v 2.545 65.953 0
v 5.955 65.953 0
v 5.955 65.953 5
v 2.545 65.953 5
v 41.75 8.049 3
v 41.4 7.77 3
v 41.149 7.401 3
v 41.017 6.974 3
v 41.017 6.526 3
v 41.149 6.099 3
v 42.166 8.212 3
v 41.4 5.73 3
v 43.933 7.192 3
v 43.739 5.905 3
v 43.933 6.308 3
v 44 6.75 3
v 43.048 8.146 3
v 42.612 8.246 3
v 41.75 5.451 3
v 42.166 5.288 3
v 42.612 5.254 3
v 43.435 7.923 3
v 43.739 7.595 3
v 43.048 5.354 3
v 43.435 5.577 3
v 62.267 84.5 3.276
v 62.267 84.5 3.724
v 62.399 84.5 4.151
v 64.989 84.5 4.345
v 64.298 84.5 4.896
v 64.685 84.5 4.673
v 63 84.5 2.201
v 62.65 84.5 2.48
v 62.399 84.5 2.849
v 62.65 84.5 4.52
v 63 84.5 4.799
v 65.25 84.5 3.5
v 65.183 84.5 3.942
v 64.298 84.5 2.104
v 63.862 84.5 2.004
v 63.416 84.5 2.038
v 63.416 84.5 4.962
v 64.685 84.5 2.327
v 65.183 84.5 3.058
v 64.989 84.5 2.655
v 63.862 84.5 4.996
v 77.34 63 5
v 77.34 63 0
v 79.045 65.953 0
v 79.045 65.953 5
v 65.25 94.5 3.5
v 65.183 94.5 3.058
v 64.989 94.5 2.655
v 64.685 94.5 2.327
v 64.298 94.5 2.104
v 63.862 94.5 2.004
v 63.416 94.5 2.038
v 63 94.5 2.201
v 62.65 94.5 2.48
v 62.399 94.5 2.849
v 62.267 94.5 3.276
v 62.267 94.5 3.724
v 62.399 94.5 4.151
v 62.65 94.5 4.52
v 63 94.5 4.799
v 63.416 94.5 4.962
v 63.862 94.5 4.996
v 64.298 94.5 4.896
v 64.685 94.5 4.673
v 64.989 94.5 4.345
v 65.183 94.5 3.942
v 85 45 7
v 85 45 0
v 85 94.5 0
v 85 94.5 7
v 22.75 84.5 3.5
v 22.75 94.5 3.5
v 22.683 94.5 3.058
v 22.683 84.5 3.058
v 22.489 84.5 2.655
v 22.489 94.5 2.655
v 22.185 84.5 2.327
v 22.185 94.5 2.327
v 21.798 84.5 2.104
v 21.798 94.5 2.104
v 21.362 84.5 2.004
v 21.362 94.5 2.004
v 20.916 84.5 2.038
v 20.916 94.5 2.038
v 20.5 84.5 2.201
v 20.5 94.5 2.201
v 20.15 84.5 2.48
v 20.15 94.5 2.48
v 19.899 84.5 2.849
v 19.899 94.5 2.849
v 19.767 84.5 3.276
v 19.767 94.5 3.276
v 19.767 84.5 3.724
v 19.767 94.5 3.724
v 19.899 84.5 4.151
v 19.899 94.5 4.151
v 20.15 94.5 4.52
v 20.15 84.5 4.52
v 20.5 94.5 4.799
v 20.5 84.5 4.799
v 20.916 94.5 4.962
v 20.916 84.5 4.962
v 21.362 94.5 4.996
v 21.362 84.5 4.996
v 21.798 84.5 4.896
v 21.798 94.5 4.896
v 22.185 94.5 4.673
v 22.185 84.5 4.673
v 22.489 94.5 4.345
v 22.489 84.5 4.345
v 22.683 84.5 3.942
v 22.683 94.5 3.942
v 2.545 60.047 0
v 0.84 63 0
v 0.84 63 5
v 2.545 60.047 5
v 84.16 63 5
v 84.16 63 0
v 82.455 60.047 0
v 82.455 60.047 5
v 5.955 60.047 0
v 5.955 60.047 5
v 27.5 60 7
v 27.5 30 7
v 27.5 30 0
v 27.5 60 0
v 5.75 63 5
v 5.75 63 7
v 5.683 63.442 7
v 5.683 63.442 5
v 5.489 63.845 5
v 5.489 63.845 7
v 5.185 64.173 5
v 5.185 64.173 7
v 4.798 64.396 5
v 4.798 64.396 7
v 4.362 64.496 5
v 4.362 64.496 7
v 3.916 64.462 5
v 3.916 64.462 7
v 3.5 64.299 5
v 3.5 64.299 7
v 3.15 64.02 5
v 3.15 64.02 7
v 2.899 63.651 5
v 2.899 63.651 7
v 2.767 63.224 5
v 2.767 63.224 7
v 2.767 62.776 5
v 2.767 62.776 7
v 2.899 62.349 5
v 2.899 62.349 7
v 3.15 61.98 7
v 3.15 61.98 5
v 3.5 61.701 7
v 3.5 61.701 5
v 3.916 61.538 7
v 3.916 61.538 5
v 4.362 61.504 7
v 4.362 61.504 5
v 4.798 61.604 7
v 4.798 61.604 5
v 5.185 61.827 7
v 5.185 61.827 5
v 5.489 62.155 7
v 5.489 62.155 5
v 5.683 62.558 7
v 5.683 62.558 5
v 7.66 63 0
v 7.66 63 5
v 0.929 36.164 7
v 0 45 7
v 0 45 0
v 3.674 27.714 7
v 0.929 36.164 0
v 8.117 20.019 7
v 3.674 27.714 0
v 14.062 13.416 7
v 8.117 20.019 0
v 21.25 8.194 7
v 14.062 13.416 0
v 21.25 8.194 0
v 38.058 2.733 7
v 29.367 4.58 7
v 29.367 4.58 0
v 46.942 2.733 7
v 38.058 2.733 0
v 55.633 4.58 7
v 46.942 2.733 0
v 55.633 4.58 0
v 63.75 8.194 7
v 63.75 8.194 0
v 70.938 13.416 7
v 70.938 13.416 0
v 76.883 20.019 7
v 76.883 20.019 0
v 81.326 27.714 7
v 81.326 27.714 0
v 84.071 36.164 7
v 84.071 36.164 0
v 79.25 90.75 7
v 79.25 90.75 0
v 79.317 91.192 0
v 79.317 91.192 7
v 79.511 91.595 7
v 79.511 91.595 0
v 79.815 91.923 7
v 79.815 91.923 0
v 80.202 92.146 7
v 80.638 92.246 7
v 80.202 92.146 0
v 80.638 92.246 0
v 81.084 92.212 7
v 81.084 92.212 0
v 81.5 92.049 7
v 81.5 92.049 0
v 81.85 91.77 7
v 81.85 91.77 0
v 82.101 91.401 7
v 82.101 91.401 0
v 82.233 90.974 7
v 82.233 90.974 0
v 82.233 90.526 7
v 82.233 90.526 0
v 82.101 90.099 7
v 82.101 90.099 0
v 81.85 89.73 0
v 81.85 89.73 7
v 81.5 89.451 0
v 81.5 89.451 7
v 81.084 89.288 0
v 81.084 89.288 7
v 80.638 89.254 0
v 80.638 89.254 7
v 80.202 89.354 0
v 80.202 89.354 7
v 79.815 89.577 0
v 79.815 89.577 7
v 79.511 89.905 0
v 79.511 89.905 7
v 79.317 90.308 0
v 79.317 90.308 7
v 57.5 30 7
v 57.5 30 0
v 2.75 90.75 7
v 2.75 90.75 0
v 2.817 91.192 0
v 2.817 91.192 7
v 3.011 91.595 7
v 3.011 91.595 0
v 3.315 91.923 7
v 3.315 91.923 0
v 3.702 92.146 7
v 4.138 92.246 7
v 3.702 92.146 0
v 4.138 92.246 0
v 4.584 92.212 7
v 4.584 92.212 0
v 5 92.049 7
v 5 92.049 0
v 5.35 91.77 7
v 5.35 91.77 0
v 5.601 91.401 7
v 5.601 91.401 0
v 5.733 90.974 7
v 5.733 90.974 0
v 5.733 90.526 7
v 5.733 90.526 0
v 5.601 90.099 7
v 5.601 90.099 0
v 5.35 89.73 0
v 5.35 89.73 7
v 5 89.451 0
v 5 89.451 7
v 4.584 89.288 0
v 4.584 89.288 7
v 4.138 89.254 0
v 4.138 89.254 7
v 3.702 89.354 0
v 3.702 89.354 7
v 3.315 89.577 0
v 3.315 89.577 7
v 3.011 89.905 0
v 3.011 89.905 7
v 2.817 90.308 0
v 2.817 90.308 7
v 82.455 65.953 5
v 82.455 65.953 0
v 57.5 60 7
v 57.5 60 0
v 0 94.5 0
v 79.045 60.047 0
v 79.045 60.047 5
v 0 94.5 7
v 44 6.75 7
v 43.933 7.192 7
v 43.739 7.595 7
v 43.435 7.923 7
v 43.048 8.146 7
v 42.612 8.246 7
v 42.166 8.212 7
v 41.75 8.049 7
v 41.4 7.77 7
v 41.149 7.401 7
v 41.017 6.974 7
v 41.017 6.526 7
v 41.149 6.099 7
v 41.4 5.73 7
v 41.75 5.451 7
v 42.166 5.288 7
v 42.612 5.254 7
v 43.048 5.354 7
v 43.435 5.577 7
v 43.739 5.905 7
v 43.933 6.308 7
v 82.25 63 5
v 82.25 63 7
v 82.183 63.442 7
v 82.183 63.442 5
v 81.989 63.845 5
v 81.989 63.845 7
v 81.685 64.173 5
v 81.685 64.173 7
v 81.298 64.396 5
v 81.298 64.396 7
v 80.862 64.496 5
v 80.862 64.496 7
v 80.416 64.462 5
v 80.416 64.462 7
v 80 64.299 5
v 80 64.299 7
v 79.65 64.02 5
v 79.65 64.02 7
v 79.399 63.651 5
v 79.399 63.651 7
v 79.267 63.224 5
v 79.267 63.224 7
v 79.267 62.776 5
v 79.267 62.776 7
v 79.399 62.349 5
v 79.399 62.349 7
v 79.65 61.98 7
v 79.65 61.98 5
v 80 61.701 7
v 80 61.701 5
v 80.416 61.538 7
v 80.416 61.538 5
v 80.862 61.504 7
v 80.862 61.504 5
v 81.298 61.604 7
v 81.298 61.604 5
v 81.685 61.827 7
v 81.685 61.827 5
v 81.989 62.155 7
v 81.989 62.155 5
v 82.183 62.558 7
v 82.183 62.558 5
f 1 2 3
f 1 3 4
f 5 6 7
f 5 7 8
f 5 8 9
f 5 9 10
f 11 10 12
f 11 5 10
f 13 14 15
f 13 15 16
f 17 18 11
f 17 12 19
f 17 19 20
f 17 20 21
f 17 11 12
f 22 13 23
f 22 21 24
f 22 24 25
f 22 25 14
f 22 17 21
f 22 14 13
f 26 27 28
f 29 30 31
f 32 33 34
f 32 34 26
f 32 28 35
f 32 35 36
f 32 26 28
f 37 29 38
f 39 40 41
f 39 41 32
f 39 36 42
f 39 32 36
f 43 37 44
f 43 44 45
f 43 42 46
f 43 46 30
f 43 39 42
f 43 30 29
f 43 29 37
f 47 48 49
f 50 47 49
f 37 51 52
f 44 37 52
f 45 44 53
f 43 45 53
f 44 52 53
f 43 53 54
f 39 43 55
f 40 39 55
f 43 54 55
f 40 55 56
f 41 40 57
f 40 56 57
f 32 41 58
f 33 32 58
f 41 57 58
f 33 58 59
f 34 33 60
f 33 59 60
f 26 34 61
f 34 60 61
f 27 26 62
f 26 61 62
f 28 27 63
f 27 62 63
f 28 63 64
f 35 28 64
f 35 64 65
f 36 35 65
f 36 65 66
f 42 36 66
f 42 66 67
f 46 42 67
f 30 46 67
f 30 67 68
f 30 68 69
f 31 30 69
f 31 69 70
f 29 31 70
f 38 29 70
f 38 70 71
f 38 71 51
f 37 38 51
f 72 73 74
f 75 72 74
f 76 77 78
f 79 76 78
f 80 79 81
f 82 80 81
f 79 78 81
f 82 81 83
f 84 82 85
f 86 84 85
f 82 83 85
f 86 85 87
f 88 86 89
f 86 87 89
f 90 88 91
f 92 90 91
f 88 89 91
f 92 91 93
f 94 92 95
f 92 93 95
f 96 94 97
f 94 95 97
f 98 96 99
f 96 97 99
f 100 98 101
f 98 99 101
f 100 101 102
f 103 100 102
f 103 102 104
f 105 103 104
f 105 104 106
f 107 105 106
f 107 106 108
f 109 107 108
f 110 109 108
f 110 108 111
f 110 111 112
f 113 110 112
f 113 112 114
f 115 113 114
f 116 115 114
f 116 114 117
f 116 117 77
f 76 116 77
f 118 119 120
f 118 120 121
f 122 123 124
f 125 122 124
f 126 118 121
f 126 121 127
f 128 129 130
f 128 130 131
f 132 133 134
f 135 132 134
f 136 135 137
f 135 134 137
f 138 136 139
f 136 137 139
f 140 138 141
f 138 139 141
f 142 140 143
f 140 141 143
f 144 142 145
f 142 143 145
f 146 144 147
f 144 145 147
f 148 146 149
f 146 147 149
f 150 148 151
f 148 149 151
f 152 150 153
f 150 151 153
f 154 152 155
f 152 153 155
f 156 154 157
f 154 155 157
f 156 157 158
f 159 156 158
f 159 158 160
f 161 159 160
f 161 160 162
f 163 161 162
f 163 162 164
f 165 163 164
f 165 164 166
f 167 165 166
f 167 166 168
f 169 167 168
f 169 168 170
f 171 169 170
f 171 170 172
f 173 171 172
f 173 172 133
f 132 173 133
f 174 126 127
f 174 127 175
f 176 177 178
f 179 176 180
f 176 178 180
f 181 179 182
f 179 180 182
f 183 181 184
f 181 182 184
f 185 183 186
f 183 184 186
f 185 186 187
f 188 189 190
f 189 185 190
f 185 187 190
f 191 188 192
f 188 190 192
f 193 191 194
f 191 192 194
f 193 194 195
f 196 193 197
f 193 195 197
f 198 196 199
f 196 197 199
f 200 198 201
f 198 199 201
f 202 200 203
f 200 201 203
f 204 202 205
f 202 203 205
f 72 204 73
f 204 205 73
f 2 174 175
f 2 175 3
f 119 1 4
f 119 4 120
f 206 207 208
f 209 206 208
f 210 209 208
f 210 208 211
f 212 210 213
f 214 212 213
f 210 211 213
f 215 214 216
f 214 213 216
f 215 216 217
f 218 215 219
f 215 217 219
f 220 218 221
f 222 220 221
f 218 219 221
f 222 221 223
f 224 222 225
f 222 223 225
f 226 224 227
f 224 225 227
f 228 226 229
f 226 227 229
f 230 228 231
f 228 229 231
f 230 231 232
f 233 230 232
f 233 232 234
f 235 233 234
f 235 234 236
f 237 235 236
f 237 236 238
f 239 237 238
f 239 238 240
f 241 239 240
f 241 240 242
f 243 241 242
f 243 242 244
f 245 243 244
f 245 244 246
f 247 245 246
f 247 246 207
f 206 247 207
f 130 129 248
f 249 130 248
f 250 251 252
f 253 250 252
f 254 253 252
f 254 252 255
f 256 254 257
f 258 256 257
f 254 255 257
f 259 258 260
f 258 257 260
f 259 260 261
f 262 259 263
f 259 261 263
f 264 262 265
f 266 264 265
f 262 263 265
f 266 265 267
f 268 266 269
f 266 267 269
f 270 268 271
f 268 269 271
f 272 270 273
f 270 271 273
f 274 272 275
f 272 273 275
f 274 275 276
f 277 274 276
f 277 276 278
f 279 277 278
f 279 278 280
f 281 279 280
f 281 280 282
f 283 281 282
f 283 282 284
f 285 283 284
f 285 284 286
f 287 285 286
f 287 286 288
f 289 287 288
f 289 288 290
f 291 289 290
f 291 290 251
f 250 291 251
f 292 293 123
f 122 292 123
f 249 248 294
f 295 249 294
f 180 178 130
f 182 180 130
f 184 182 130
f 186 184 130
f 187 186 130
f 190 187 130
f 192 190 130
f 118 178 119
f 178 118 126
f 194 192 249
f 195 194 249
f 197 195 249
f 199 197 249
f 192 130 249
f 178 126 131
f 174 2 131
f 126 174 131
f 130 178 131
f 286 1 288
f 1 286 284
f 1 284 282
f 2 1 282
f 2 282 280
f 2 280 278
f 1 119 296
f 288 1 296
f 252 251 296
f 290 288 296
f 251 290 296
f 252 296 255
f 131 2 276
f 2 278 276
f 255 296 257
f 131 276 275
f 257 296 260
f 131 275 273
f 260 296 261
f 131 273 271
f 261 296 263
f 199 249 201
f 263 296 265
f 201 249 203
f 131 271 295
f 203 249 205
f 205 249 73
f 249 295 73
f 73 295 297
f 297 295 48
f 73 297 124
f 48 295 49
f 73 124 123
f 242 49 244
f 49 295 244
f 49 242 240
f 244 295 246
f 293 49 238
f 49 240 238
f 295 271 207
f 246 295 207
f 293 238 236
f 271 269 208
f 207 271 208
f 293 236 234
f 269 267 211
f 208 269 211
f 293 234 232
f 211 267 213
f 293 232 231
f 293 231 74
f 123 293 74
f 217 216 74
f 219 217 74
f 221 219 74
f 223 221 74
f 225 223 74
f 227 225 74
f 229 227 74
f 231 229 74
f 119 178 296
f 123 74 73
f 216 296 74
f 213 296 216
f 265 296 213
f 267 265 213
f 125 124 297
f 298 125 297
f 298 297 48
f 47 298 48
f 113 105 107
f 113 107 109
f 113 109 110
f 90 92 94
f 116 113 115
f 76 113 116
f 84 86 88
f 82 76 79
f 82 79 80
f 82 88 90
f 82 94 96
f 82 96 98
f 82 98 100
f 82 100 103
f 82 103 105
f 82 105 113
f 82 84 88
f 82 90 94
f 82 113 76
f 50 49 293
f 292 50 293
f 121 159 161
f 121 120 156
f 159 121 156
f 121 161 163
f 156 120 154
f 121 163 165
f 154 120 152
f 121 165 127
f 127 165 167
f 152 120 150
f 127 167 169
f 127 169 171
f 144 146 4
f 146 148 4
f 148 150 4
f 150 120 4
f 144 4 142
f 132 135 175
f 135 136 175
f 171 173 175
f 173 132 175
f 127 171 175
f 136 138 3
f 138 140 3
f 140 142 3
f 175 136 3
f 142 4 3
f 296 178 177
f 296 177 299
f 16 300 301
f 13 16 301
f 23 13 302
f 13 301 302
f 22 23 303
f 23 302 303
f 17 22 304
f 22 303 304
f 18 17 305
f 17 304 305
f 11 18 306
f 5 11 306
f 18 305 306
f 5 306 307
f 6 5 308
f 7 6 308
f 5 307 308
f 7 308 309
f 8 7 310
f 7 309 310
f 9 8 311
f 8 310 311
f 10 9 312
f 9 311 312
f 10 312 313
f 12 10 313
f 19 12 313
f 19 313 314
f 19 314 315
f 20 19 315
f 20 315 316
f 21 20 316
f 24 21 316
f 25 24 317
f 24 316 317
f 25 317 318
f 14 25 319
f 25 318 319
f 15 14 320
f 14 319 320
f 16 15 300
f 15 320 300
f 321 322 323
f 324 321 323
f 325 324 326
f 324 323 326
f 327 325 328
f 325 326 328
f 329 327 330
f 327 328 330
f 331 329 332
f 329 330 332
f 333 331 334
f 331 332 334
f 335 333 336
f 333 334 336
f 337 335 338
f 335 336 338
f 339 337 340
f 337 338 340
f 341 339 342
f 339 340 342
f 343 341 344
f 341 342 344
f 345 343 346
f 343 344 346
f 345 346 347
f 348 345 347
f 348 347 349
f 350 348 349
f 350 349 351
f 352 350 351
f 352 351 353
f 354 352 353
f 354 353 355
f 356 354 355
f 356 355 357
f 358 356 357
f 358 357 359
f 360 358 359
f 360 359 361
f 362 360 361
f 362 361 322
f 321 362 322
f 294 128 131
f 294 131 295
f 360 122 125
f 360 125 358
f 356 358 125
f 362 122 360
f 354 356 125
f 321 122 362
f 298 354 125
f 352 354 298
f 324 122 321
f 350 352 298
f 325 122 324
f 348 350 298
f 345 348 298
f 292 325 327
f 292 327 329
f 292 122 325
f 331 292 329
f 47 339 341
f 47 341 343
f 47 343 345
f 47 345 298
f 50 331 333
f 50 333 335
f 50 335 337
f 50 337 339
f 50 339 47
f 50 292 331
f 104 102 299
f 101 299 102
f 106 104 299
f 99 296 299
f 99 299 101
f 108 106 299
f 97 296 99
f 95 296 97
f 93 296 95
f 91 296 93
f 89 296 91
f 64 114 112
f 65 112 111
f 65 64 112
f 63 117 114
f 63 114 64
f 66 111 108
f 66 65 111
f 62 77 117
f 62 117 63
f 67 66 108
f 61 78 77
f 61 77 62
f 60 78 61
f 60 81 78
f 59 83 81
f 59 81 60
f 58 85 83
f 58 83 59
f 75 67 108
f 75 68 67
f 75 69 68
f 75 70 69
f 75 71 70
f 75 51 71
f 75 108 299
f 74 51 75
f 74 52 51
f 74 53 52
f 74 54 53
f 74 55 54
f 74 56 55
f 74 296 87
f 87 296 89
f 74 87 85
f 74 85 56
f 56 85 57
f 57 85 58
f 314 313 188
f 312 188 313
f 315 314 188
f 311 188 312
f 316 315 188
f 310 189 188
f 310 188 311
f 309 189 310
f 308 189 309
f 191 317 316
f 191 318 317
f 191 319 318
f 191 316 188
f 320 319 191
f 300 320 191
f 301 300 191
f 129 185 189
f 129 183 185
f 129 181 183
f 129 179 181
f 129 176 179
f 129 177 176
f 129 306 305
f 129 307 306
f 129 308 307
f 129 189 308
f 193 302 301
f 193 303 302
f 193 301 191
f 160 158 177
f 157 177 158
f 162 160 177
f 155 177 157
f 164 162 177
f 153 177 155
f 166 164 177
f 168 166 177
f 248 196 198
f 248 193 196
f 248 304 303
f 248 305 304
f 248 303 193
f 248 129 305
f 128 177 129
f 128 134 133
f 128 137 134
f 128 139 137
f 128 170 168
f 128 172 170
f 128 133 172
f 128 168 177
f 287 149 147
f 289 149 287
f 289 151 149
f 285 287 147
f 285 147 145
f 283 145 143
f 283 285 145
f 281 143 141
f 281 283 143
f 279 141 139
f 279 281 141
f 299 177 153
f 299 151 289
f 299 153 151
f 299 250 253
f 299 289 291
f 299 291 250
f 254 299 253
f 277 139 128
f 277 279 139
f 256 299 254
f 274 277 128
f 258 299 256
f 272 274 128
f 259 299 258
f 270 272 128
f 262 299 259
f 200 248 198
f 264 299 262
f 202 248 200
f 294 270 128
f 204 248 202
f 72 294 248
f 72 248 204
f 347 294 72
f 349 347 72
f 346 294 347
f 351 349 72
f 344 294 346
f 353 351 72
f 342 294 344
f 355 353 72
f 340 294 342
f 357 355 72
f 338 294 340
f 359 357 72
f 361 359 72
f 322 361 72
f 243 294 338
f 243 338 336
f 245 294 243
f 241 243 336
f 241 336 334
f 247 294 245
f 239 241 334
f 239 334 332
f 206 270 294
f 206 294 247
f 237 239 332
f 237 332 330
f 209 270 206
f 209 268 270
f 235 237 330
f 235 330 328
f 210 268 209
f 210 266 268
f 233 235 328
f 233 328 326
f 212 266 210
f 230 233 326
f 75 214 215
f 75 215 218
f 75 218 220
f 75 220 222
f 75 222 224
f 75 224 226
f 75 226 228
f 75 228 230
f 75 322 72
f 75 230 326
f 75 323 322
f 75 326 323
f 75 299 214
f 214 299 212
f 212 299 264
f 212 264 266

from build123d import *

# Parameters (mm, degrees)
SKETCH1_W           = 85
SKETCH1_H           = 95
BOSS_EXTRUDE1_DEPTH = 7
SKETCH2_W           = 30
SKETCH2_H           = 30
CUT_EXTRUDE1_DEPTH  = 7
SKETCH4_R           = 1.5
CUT_EXTRUDE2_DEPTH  = 10.5
SKETCH6_R           = 1.5
CUT_EXTRUDE3_DEPTH  = 8
CUT_EXTRUDE4_DEPTH  = 10
SKETCH8_R           = 1.5
CUT_EXTRUDE5_DEPTH  = 10
CUT_EXTRUDE6_DEPTH  = 5
SKETCH11_R          = 1.5
CUT_EXTRUDE8_DEPTH  = 4
SKETCH12_W          = 85
SKETCH12_H          = 7
CUT_EXTRUDE9_DEPTH  = 0.5


with BuildPart() as part:
    # Sketch1 → Boss-Extrude1 (new body)
    with BuildSketch(Plane.XY):
        with Locations((42.5, 47.5)):
            Rectangle(SKETCH1_W, SKETCH1_H)
    extrude(amount=BOSS_EXTRUDE1_DEPTH)

    # Sketch2 → Cut-Extrude1 (cut)
    with BuildSketch(Plane.XY.offset(7)):
        with Locations((42.5, 45)):
            Rectangle(SKETCH2_W, SKETCH2_H)
    extrude(amount=-CUT_EXTRUDE1_DEPTH, mode=Mode.SUBTRACT)

    # Sketch4 → Cut-Extrude2 (cut)
    with BuildSketch(Plane(origin=(0, 95, 0), x_dir=(1, 0, 0), z_dir=(0, 1, 0))):
        with Locations((21.25, -3.5)):
            Circle(SKETCH4_R)
        with Locations((63.75, -3.5)):
            Circle(SKETCH4_R)
    extrude(amount=-CUT_EXTRUDE2_DEPTH, mode=Mode.SUBTRACT)

    # Sketch6 → Cut-Extrude3 (cut)
    with BuildSketch(Plane(origin=(0, 0, 0), x_dir=(-1, 0, 0), z_dir=(0, 0, -1))):
        with Locations((-80.75, 90.75)):
            Circle(SKETCH6_R)
        with Locations((-4.25, 90.75)):
            Circle(SKETCH6_R)
        with Locations((-4.45, 4.25)):
            Circle(SKETCH6_R)
        with Locations((-80.75, 7.25)):
            Circle(SKETCH6_R)
    extrude(amount=-CUT_EXTRUDE3_DEPTH, mode=Mode.SUBTRACT)

    # Sketch7 → Cut-Extrude4 (cut)
    with BuildSketch(Plane(origin=(0, 0, 0), x_dir=(-1, 0, 0), z_dir=(0, 0, -1))):
        with BuildLine():
            Line((-85, 45), (-85, 0))
            Line((-85, 0), (0, 0))
            Line((0, 0), (0, 45))
            ThreePointArc((0, 45), (-42.5, 2.5), (-85, 45))
        make_face()
    extrude(amount=-CUT_EXTRUDE4_DEPTH, mode=Mode.SUBTRACT)

    # Sketch8 → Cut-Extrude5 (cut)
    with BuildSketch(Plane.XY.offset(7)):
        with Locations((80.75, 63)):
            Circle(SKETCH8_R)
        with Locations((4.25, 63)):
            Circle(SKETCH8_R)
    extrude(amount=-CUT_EXTRUDE5_DEPTH, mode=Mode.SUBTRACT)

    # Sketch9 → Cut-Extrude6 (cut)
    with BuildSketch(Plane(origin=(0, 0, 0), x_dir=(-1, 0, 0), z_dir=(0, 0, -1))):
        Polygon((-79.045, 65.953146627), (-82.455, 65.953146627), (-84.16, 63), (-82.455, 60.046853373), (-79.045, 60.046853373), (-77.34, 63), align=None)
        Polygon((-0.84, 63), (-2.545, 60.046853373), (-5.955, 60.046853373), (-7.66, 63), (-5.955, 65.953146627), (-2.545, 65.953146627), align=None)
    extrude(amount=-CUT_EXTRUDE6_DEPTH, mode=Mode.SUBTRACT)

    # Sketch11 → Cut-Extrude8 (cut)
    with BuildSketch(Plane.XY.offset(7)):
        with Locations((42.5, 6.75)):
            Circle(SKETCH11_R)
    extrude(amount=-CUT_EXTRUDE8_DEPTH, mode=Mode.SUBTRACT)

    # Sketch12 → Cut-Extrude9 (cut)
    with BuildSketch(Plane(origin=(0, 95, 0), x_dir=(1, 0, 0), z_dir=(0, 1, 0))):
        with Locations((42.5, -3.5)):
            Rectangle(SKETCH12_W, SKETCH12_H)
    extrude(amount=-CUT_EXTRUDE9_DEPTH, mode=Mode.SUBTRACT)


solid = part.part
